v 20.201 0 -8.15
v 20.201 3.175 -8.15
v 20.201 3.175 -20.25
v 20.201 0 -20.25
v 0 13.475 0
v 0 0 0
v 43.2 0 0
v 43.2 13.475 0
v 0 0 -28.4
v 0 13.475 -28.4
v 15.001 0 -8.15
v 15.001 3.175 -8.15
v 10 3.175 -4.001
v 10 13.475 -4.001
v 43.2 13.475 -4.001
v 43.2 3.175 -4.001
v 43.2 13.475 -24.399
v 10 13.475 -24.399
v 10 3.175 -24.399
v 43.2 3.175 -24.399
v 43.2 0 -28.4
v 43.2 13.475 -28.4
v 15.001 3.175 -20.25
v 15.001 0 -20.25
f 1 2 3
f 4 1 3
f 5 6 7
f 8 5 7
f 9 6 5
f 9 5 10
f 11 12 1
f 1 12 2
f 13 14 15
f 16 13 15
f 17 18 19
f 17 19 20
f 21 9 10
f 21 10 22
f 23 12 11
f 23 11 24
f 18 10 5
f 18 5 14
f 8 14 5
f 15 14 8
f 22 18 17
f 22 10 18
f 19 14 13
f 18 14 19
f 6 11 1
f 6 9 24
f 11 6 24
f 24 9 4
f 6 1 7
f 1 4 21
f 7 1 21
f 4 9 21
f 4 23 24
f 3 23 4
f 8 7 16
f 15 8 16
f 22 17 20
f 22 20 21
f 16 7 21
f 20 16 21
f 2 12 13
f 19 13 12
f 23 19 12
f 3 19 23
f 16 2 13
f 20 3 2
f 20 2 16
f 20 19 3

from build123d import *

# Parameters (mm, degrees)
SKETCH1_W           = 43.20032
SKETCH1_H           = 28.39974
BOSS_EXTRUDE1_DEPTH = 13.4747
SKETCH2_W           = 33.20034
SKETCH2_H           = 20.39874
CUT_EXTRUDE1_DEPTH  = 10.2997
SKETCH3_W           = 5.19938
SKETCH3_H           = 12.10056
CUT_EXTRUDE2_DEPTH  = 53.715241631


with BuildPart() as part:
    # Sketch1 → Boss-Extrude1 (new body)
    with BuildSketch(Plane(origin=(0, 0, 0), x_dir=(1, 0, 0), z_dir=(0, 1, 0))):
        with Locations((21.60016, 14.19987)):
            Rectangle(SKETCH1_W, SKETCH1_H)
    extrude(amount=BOSS_EXTRUDE1_DEPTH)

    # Sketch2 → Cut-Extrude1 (cut)
    with BuildSketch(Plane(origin=(0, 13.4747, 0), x_dir=(1, 0, 0), z_dir=(0, 1, 0))):
        with Locations((26.60015, 14.19987)):
            Rectangle(SKETCH2_W, SKETCH2_H)
    extrude(amount=-CUT_EXTRUDE1_DEPTH, mode=Mode.SUBTRACT)

    # Sketch3 → Cut-Extrude2 (cut, through all)
    with BuildSketch(Plane(origin=(0, 3.175, 0), x_dir=(1, 0, 0), z_dir=(0, 1, 0))):
        with Locations((17.60093, 14.19987)):
            Rectangle(SKETCH3_W, SKETCH3_H)
    extrude(amount=-CUT_EXTRUDE2_DEPTH, mode=Mode.SUBTRACT)


solid = part.part
